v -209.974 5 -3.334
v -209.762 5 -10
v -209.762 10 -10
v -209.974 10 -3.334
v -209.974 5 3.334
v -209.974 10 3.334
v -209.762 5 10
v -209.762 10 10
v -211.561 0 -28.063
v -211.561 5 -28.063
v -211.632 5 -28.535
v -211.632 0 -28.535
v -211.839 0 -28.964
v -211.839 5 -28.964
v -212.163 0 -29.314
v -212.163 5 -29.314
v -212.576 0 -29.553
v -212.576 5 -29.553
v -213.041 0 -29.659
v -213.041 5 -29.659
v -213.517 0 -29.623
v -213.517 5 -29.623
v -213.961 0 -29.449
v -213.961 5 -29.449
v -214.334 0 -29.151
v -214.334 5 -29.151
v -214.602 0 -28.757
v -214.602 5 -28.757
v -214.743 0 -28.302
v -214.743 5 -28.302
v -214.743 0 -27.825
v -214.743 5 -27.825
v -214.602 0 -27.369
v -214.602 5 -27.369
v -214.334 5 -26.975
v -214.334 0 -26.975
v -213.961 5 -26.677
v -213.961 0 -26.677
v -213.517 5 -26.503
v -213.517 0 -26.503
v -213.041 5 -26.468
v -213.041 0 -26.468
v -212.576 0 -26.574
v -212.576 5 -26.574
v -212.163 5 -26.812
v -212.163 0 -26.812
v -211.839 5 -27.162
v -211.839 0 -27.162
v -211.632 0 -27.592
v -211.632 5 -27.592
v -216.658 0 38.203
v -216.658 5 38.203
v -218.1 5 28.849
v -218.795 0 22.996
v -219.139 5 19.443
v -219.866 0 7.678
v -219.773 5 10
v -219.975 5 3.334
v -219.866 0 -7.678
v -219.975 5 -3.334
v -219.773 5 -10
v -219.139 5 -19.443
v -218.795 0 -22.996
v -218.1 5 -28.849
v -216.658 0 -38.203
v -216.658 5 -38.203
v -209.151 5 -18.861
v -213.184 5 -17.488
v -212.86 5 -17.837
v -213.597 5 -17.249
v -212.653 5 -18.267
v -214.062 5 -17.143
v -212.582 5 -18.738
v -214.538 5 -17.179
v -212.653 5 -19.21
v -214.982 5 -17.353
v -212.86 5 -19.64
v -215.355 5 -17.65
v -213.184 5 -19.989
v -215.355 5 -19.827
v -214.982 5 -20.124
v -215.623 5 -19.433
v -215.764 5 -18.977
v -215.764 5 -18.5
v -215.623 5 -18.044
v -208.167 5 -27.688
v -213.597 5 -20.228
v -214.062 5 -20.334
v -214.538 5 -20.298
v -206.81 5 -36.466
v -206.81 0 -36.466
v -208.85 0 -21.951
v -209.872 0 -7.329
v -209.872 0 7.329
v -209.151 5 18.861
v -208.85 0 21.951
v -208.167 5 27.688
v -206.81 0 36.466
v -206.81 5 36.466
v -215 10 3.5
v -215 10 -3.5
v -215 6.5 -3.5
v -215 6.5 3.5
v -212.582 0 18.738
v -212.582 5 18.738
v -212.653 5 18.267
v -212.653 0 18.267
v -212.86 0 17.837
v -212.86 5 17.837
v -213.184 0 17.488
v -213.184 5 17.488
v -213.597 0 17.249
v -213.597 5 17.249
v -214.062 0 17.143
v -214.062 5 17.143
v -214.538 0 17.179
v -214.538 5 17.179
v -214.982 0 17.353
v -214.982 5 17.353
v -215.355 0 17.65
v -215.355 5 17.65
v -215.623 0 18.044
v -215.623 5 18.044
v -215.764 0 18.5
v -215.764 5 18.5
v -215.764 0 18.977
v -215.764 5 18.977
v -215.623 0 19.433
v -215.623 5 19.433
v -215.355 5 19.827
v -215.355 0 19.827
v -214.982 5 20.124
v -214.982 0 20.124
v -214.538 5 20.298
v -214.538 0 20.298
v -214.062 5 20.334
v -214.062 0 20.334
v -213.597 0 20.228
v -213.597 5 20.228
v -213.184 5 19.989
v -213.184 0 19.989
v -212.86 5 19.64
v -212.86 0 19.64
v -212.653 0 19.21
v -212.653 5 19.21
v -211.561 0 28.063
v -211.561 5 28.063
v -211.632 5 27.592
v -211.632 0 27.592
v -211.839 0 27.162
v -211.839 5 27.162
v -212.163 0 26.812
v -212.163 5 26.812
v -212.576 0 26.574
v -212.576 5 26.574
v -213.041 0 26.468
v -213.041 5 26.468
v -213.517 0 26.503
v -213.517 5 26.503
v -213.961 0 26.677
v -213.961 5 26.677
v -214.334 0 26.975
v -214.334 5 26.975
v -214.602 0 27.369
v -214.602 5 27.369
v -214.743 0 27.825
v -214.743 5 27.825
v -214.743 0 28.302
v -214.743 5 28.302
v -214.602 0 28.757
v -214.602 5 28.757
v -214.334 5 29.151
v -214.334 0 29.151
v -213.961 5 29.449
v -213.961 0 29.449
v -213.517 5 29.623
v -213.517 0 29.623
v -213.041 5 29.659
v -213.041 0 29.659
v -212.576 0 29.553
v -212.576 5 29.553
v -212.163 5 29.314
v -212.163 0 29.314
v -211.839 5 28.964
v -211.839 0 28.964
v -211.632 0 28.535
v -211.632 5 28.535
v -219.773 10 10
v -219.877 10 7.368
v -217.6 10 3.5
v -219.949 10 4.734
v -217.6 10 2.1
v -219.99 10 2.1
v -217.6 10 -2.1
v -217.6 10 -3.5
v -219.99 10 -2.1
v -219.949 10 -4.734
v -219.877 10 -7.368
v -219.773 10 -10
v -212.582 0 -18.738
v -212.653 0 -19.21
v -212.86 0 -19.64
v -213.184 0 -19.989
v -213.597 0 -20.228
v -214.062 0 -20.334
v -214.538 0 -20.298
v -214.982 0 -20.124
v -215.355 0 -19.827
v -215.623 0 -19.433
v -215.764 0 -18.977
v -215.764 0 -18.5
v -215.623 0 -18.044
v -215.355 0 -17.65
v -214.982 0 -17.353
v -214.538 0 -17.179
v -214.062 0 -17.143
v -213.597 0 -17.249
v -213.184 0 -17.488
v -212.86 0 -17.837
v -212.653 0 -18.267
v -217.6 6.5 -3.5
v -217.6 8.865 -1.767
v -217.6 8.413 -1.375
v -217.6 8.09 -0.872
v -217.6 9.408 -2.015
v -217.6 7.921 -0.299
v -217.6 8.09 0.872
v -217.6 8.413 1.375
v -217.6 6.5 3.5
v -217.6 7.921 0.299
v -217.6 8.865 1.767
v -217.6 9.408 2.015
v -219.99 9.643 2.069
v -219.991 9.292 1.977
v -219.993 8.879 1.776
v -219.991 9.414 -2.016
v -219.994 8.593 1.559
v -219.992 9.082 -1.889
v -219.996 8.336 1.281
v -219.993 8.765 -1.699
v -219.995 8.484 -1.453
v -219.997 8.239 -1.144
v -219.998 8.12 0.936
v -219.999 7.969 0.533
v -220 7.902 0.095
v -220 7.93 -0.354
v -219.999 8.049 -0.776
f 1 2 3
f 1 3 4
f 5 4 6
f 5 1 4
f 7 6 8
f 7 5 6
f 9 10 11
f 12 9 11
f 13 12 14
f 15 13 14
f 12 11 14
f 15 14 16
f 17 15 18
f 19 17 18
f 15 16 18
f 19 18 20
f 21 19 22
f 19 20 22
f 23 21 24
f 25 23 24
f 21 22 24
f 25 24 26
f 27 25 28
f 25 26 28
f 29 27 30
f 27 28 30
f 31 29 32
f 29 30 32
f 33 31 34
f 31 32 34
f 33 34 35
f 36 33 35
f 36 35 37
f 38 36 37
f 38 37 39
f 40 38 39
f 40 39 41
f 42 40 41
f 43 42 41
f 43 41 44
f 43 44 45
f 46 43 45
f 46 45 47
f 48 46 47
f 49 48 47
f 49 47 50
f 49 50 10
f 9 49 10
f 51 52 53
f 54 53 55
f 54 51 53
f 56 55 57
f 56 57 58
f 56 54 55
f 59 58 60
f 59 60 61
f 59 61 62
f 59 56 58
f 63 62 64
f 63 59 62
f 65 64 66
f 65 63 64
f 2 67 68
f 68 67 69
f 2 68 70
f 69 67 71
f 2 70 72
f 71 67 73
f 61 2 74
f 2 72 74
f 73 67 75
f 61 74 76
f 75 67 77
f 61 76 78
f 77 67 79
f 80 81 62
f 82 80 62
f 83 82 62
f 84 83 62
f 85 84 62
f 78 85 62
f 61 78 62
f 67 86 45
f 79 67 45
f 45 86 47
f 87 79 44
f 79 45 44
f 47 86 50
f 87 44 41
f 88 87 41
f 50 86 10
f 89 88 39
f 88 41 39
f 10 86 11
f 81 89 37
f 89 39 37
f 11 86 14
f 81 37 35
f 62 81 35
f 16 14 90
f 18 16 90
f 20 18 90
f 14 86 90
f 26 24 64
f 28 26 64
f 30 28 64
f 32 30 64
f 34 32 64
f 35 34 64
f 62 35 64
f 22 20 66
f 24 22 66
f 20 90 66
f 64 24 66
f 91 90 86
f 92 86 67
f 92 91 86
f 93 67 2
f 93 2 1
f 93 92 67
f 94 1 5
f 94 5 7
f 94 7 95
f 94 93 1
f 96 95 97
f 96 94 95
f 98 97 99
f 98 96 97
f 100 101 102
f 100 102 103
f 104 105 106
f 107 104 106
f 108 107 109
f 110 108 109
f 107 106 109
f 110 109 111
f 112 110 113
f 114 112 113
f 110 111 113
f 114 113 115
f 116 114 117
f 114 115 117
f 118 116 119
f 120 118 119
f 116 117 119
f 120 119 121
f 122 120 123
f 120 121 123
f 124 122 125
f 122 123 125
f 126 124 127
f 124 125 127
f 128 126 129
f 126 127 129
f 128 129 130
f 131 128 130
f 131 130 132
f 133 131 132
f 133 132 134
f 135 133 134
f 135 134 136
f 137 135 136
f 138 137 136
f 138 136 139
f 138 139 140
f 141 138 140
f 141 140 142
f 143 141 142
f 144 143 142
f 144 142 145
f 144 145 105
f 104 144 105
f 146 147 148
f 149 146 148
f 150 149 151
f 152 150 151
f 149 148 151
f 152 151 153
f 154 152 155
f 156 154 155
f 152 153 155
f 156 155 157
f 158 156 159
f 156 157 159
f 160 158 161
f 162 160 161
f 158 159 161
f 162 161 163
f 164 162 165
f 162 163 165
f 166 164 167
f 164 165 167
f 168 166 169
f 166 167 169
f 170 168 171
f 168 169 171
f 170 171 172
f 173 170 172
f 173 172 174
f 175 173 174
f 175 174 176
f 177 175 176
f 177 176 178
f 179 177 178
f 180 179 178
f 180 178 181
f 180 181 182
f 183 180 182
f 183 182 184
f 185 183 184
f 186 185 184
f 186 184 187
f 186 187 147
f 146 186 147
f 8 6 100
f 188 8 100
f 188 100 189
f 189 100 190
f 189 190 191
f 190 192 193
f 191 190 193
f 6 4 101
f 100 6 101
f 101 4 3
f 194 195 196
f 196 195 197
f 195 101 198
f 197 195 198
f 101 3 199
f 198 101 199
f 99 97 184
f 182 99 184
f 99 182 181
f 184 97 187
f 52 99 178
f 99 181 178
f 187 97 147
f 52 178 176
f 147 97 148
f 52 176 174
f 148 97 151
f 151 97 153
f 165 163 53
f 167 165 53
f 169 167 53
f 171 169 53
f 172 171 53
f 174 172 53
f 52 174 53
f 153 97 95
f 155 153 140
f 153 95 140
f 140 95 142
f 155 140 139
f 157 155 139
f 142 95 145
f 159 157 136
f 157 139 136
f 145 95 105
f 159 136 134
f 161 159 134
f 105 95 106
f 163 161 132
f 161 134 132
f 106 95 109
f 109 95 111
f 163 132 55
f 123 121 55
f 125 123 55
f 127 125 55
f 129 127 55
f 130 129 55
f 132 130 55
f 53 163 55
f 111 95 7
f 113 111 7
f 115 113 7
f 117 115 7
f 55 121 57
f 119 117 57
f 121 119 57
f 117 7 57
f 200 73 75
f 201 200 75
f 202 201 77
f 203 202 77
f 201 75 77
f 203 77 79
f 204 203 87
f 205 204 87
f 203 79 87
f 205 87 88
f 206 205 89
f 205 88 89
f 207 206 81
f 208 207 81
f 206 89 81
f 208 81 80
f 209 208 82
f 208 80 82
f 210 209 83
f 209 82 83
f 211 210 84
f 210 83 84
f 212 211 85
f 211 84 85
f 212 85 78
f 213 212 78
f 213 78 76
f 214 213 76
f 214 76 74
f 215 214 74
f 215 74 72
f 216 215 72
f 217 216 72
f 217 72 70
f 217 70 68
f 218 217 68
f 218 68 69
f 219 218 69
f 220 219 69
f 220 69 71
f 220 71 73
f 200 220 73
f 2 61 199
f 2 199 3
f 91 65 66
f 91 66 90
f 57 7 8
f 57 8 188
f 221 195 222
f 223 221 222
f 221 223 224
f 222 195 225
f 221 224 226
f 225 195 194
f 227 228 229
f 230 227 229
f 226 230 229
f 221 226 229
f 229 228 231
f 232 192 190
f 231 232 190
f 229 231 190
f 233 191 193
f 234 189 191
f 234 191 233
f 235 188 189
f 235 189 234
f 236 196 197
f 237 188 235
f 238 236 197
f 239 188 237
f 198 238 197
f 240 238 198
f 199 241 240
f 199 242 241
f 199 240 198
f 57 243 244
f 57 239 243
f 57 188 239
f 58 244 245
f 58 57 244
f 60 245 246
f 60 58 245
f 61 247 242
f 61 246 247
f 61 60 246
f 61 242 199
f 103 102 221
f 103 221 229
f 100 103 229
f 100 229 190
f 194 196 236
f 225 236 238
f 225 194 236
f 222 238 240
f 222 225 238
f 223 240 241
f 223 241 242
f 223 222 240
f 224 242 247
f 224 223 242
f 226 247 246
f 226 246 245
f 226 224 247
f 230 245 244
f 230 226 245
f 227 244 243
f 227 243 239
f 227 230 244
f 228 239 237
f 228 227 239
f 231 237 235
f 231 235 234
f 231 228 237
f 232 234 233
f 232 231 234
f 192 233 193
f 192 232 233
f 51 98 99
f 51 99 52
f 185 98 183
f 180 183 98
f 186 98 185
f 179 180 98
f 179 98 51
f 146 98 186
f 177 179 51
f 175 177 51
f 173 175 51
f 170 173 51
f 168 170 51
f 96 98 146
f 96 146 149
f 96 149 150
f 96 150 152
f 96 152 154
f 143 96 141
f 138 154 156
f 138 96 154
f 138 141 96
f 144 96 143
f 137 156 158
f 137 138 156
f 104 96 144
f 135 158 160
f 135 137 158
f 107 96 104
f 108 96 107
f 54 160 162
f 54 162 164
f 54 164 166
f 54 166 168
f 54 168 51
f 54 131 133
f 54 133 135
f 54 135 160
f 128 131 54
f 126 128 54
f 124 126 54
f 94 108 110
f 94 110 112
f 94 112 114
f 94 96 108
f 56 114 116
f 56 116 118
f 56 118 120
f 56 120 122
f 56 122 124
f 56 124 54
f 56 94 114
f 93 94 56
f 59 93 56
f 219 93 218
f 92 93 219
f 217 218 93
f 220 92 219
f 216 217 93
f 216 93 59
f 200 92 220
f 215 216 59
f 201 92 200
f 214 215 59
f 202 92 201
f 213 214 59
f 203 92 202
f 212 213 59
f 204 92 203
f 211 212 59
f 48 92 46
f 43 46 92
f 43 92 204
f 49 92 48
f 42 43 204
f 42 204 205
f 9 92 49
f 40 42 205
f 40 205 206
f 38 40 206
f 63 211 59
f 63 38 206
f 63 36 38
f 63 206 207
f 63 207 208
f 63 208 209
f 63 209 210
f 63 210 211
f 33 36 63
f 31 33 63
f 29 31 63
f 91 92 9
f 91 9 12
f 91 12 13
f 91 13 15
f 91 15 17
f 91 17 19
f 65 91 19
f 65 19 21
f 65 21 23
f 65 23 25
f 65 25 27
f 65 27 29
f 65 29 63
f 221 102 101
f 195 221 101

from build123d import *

# Parameters (mm, degrees)
BOSS_EXTRUDE1_DEPTH        = 5
F_3_2_3_2_DIAMETER_HOLE1_D = 3.2
BOSS_EXTRUDE2_DEPTH        = 5
SKETCH10_W                 = 7
SKETCH10_H                 = 7
CUT_EXTRUDE2_DEPTH         = 2.6
SKETCH11_R                 = 2.1
CUT_EXTRUDE3_DEPTH         = 41.33014714


with BuildPart() as part:
    # Sketch1 → Boss-Extrude1 (new body)
    with BuildSketch(Plane(origin=(0, 0, 0), x_dir=(1, 0, 0), z_dir=(0, 1, 0))):
        with BuildLine():
            Line((-216.657705663, 38.202599087), (-206.809628133, 36.46611731))
            ThreePointArc((-206.809628133, 36.46611731), (-210, 0), (-206.809628133, -36.46611731))
            Line((-206.809628133, -36.46611731), (-216.657705663, -38.202599087))
            ThreePointArc((-216.657705663, -38.202599087), (-220, 0), (-216.657705663, 38.202599087))
        make_face()
    extrude(amount=BOSS_EXTRUDE1_DEPTH)

    # Ø3.2 (3.2) Diameter Hole1 (through all)
    with Locations(Plane(origin=(0, 0, 0), x_dir=(-1, 0, 0), z_dir=(0, -1, 0))):
        with Locations((214.18186009, -18.738484691), (214.18186009, 18.738484691), (213.160645195, -28.063131327), (213.160645195, 28.063131327)):
            Hole(F_3_2_3_2_DIAMETER_HOLE1_D / 2)

    # Sketch9 → Boss-Extrude2 (add)
    with BuildSketch(Plane(origin=(0, 5, 0), x_dir=(1, 0, 0), z_dir=(0, 1, 0))):
        with BuildLine():
            Line((-219.772609758, 10), (-209.761769634, 10))
            ThreePointArc((-209.761769634, 10), (-210, 0), (-209.761769634, -10))
            Line((-209.761769634, -10), (-219.772609758, -10))
            ThreePointArc((-219.772609758, -10), (-220, 0), (-219.772609758, 10))
        make_face()
    extrude(amount=BOSS_EXTRUDE2_DEPTH)

    # Sketch10 → Cut-Extrude2 (cut)
    with BuildSketch(Plane.ZY.offset(215)):
        with Locations((0, 10)):
            Rectangle(SKETCH10_W, SKETCH10_H)
    extrude(amount=CUT_EXTRUDE2_DEPTH, mode=Mode.SUBTRACT)

    # Sketch11 → Cut-Extrude3 (cut, through all)
    with BuildSketch(Plane.ZY.offset(215)):
        with Locations((0, 10)):
            Circle(SKETCH11_R)
    extrude(amount=CUT_EXTRUDE3_DEPTH, mode=Mode.SUBTRACT)


solid = part.part
